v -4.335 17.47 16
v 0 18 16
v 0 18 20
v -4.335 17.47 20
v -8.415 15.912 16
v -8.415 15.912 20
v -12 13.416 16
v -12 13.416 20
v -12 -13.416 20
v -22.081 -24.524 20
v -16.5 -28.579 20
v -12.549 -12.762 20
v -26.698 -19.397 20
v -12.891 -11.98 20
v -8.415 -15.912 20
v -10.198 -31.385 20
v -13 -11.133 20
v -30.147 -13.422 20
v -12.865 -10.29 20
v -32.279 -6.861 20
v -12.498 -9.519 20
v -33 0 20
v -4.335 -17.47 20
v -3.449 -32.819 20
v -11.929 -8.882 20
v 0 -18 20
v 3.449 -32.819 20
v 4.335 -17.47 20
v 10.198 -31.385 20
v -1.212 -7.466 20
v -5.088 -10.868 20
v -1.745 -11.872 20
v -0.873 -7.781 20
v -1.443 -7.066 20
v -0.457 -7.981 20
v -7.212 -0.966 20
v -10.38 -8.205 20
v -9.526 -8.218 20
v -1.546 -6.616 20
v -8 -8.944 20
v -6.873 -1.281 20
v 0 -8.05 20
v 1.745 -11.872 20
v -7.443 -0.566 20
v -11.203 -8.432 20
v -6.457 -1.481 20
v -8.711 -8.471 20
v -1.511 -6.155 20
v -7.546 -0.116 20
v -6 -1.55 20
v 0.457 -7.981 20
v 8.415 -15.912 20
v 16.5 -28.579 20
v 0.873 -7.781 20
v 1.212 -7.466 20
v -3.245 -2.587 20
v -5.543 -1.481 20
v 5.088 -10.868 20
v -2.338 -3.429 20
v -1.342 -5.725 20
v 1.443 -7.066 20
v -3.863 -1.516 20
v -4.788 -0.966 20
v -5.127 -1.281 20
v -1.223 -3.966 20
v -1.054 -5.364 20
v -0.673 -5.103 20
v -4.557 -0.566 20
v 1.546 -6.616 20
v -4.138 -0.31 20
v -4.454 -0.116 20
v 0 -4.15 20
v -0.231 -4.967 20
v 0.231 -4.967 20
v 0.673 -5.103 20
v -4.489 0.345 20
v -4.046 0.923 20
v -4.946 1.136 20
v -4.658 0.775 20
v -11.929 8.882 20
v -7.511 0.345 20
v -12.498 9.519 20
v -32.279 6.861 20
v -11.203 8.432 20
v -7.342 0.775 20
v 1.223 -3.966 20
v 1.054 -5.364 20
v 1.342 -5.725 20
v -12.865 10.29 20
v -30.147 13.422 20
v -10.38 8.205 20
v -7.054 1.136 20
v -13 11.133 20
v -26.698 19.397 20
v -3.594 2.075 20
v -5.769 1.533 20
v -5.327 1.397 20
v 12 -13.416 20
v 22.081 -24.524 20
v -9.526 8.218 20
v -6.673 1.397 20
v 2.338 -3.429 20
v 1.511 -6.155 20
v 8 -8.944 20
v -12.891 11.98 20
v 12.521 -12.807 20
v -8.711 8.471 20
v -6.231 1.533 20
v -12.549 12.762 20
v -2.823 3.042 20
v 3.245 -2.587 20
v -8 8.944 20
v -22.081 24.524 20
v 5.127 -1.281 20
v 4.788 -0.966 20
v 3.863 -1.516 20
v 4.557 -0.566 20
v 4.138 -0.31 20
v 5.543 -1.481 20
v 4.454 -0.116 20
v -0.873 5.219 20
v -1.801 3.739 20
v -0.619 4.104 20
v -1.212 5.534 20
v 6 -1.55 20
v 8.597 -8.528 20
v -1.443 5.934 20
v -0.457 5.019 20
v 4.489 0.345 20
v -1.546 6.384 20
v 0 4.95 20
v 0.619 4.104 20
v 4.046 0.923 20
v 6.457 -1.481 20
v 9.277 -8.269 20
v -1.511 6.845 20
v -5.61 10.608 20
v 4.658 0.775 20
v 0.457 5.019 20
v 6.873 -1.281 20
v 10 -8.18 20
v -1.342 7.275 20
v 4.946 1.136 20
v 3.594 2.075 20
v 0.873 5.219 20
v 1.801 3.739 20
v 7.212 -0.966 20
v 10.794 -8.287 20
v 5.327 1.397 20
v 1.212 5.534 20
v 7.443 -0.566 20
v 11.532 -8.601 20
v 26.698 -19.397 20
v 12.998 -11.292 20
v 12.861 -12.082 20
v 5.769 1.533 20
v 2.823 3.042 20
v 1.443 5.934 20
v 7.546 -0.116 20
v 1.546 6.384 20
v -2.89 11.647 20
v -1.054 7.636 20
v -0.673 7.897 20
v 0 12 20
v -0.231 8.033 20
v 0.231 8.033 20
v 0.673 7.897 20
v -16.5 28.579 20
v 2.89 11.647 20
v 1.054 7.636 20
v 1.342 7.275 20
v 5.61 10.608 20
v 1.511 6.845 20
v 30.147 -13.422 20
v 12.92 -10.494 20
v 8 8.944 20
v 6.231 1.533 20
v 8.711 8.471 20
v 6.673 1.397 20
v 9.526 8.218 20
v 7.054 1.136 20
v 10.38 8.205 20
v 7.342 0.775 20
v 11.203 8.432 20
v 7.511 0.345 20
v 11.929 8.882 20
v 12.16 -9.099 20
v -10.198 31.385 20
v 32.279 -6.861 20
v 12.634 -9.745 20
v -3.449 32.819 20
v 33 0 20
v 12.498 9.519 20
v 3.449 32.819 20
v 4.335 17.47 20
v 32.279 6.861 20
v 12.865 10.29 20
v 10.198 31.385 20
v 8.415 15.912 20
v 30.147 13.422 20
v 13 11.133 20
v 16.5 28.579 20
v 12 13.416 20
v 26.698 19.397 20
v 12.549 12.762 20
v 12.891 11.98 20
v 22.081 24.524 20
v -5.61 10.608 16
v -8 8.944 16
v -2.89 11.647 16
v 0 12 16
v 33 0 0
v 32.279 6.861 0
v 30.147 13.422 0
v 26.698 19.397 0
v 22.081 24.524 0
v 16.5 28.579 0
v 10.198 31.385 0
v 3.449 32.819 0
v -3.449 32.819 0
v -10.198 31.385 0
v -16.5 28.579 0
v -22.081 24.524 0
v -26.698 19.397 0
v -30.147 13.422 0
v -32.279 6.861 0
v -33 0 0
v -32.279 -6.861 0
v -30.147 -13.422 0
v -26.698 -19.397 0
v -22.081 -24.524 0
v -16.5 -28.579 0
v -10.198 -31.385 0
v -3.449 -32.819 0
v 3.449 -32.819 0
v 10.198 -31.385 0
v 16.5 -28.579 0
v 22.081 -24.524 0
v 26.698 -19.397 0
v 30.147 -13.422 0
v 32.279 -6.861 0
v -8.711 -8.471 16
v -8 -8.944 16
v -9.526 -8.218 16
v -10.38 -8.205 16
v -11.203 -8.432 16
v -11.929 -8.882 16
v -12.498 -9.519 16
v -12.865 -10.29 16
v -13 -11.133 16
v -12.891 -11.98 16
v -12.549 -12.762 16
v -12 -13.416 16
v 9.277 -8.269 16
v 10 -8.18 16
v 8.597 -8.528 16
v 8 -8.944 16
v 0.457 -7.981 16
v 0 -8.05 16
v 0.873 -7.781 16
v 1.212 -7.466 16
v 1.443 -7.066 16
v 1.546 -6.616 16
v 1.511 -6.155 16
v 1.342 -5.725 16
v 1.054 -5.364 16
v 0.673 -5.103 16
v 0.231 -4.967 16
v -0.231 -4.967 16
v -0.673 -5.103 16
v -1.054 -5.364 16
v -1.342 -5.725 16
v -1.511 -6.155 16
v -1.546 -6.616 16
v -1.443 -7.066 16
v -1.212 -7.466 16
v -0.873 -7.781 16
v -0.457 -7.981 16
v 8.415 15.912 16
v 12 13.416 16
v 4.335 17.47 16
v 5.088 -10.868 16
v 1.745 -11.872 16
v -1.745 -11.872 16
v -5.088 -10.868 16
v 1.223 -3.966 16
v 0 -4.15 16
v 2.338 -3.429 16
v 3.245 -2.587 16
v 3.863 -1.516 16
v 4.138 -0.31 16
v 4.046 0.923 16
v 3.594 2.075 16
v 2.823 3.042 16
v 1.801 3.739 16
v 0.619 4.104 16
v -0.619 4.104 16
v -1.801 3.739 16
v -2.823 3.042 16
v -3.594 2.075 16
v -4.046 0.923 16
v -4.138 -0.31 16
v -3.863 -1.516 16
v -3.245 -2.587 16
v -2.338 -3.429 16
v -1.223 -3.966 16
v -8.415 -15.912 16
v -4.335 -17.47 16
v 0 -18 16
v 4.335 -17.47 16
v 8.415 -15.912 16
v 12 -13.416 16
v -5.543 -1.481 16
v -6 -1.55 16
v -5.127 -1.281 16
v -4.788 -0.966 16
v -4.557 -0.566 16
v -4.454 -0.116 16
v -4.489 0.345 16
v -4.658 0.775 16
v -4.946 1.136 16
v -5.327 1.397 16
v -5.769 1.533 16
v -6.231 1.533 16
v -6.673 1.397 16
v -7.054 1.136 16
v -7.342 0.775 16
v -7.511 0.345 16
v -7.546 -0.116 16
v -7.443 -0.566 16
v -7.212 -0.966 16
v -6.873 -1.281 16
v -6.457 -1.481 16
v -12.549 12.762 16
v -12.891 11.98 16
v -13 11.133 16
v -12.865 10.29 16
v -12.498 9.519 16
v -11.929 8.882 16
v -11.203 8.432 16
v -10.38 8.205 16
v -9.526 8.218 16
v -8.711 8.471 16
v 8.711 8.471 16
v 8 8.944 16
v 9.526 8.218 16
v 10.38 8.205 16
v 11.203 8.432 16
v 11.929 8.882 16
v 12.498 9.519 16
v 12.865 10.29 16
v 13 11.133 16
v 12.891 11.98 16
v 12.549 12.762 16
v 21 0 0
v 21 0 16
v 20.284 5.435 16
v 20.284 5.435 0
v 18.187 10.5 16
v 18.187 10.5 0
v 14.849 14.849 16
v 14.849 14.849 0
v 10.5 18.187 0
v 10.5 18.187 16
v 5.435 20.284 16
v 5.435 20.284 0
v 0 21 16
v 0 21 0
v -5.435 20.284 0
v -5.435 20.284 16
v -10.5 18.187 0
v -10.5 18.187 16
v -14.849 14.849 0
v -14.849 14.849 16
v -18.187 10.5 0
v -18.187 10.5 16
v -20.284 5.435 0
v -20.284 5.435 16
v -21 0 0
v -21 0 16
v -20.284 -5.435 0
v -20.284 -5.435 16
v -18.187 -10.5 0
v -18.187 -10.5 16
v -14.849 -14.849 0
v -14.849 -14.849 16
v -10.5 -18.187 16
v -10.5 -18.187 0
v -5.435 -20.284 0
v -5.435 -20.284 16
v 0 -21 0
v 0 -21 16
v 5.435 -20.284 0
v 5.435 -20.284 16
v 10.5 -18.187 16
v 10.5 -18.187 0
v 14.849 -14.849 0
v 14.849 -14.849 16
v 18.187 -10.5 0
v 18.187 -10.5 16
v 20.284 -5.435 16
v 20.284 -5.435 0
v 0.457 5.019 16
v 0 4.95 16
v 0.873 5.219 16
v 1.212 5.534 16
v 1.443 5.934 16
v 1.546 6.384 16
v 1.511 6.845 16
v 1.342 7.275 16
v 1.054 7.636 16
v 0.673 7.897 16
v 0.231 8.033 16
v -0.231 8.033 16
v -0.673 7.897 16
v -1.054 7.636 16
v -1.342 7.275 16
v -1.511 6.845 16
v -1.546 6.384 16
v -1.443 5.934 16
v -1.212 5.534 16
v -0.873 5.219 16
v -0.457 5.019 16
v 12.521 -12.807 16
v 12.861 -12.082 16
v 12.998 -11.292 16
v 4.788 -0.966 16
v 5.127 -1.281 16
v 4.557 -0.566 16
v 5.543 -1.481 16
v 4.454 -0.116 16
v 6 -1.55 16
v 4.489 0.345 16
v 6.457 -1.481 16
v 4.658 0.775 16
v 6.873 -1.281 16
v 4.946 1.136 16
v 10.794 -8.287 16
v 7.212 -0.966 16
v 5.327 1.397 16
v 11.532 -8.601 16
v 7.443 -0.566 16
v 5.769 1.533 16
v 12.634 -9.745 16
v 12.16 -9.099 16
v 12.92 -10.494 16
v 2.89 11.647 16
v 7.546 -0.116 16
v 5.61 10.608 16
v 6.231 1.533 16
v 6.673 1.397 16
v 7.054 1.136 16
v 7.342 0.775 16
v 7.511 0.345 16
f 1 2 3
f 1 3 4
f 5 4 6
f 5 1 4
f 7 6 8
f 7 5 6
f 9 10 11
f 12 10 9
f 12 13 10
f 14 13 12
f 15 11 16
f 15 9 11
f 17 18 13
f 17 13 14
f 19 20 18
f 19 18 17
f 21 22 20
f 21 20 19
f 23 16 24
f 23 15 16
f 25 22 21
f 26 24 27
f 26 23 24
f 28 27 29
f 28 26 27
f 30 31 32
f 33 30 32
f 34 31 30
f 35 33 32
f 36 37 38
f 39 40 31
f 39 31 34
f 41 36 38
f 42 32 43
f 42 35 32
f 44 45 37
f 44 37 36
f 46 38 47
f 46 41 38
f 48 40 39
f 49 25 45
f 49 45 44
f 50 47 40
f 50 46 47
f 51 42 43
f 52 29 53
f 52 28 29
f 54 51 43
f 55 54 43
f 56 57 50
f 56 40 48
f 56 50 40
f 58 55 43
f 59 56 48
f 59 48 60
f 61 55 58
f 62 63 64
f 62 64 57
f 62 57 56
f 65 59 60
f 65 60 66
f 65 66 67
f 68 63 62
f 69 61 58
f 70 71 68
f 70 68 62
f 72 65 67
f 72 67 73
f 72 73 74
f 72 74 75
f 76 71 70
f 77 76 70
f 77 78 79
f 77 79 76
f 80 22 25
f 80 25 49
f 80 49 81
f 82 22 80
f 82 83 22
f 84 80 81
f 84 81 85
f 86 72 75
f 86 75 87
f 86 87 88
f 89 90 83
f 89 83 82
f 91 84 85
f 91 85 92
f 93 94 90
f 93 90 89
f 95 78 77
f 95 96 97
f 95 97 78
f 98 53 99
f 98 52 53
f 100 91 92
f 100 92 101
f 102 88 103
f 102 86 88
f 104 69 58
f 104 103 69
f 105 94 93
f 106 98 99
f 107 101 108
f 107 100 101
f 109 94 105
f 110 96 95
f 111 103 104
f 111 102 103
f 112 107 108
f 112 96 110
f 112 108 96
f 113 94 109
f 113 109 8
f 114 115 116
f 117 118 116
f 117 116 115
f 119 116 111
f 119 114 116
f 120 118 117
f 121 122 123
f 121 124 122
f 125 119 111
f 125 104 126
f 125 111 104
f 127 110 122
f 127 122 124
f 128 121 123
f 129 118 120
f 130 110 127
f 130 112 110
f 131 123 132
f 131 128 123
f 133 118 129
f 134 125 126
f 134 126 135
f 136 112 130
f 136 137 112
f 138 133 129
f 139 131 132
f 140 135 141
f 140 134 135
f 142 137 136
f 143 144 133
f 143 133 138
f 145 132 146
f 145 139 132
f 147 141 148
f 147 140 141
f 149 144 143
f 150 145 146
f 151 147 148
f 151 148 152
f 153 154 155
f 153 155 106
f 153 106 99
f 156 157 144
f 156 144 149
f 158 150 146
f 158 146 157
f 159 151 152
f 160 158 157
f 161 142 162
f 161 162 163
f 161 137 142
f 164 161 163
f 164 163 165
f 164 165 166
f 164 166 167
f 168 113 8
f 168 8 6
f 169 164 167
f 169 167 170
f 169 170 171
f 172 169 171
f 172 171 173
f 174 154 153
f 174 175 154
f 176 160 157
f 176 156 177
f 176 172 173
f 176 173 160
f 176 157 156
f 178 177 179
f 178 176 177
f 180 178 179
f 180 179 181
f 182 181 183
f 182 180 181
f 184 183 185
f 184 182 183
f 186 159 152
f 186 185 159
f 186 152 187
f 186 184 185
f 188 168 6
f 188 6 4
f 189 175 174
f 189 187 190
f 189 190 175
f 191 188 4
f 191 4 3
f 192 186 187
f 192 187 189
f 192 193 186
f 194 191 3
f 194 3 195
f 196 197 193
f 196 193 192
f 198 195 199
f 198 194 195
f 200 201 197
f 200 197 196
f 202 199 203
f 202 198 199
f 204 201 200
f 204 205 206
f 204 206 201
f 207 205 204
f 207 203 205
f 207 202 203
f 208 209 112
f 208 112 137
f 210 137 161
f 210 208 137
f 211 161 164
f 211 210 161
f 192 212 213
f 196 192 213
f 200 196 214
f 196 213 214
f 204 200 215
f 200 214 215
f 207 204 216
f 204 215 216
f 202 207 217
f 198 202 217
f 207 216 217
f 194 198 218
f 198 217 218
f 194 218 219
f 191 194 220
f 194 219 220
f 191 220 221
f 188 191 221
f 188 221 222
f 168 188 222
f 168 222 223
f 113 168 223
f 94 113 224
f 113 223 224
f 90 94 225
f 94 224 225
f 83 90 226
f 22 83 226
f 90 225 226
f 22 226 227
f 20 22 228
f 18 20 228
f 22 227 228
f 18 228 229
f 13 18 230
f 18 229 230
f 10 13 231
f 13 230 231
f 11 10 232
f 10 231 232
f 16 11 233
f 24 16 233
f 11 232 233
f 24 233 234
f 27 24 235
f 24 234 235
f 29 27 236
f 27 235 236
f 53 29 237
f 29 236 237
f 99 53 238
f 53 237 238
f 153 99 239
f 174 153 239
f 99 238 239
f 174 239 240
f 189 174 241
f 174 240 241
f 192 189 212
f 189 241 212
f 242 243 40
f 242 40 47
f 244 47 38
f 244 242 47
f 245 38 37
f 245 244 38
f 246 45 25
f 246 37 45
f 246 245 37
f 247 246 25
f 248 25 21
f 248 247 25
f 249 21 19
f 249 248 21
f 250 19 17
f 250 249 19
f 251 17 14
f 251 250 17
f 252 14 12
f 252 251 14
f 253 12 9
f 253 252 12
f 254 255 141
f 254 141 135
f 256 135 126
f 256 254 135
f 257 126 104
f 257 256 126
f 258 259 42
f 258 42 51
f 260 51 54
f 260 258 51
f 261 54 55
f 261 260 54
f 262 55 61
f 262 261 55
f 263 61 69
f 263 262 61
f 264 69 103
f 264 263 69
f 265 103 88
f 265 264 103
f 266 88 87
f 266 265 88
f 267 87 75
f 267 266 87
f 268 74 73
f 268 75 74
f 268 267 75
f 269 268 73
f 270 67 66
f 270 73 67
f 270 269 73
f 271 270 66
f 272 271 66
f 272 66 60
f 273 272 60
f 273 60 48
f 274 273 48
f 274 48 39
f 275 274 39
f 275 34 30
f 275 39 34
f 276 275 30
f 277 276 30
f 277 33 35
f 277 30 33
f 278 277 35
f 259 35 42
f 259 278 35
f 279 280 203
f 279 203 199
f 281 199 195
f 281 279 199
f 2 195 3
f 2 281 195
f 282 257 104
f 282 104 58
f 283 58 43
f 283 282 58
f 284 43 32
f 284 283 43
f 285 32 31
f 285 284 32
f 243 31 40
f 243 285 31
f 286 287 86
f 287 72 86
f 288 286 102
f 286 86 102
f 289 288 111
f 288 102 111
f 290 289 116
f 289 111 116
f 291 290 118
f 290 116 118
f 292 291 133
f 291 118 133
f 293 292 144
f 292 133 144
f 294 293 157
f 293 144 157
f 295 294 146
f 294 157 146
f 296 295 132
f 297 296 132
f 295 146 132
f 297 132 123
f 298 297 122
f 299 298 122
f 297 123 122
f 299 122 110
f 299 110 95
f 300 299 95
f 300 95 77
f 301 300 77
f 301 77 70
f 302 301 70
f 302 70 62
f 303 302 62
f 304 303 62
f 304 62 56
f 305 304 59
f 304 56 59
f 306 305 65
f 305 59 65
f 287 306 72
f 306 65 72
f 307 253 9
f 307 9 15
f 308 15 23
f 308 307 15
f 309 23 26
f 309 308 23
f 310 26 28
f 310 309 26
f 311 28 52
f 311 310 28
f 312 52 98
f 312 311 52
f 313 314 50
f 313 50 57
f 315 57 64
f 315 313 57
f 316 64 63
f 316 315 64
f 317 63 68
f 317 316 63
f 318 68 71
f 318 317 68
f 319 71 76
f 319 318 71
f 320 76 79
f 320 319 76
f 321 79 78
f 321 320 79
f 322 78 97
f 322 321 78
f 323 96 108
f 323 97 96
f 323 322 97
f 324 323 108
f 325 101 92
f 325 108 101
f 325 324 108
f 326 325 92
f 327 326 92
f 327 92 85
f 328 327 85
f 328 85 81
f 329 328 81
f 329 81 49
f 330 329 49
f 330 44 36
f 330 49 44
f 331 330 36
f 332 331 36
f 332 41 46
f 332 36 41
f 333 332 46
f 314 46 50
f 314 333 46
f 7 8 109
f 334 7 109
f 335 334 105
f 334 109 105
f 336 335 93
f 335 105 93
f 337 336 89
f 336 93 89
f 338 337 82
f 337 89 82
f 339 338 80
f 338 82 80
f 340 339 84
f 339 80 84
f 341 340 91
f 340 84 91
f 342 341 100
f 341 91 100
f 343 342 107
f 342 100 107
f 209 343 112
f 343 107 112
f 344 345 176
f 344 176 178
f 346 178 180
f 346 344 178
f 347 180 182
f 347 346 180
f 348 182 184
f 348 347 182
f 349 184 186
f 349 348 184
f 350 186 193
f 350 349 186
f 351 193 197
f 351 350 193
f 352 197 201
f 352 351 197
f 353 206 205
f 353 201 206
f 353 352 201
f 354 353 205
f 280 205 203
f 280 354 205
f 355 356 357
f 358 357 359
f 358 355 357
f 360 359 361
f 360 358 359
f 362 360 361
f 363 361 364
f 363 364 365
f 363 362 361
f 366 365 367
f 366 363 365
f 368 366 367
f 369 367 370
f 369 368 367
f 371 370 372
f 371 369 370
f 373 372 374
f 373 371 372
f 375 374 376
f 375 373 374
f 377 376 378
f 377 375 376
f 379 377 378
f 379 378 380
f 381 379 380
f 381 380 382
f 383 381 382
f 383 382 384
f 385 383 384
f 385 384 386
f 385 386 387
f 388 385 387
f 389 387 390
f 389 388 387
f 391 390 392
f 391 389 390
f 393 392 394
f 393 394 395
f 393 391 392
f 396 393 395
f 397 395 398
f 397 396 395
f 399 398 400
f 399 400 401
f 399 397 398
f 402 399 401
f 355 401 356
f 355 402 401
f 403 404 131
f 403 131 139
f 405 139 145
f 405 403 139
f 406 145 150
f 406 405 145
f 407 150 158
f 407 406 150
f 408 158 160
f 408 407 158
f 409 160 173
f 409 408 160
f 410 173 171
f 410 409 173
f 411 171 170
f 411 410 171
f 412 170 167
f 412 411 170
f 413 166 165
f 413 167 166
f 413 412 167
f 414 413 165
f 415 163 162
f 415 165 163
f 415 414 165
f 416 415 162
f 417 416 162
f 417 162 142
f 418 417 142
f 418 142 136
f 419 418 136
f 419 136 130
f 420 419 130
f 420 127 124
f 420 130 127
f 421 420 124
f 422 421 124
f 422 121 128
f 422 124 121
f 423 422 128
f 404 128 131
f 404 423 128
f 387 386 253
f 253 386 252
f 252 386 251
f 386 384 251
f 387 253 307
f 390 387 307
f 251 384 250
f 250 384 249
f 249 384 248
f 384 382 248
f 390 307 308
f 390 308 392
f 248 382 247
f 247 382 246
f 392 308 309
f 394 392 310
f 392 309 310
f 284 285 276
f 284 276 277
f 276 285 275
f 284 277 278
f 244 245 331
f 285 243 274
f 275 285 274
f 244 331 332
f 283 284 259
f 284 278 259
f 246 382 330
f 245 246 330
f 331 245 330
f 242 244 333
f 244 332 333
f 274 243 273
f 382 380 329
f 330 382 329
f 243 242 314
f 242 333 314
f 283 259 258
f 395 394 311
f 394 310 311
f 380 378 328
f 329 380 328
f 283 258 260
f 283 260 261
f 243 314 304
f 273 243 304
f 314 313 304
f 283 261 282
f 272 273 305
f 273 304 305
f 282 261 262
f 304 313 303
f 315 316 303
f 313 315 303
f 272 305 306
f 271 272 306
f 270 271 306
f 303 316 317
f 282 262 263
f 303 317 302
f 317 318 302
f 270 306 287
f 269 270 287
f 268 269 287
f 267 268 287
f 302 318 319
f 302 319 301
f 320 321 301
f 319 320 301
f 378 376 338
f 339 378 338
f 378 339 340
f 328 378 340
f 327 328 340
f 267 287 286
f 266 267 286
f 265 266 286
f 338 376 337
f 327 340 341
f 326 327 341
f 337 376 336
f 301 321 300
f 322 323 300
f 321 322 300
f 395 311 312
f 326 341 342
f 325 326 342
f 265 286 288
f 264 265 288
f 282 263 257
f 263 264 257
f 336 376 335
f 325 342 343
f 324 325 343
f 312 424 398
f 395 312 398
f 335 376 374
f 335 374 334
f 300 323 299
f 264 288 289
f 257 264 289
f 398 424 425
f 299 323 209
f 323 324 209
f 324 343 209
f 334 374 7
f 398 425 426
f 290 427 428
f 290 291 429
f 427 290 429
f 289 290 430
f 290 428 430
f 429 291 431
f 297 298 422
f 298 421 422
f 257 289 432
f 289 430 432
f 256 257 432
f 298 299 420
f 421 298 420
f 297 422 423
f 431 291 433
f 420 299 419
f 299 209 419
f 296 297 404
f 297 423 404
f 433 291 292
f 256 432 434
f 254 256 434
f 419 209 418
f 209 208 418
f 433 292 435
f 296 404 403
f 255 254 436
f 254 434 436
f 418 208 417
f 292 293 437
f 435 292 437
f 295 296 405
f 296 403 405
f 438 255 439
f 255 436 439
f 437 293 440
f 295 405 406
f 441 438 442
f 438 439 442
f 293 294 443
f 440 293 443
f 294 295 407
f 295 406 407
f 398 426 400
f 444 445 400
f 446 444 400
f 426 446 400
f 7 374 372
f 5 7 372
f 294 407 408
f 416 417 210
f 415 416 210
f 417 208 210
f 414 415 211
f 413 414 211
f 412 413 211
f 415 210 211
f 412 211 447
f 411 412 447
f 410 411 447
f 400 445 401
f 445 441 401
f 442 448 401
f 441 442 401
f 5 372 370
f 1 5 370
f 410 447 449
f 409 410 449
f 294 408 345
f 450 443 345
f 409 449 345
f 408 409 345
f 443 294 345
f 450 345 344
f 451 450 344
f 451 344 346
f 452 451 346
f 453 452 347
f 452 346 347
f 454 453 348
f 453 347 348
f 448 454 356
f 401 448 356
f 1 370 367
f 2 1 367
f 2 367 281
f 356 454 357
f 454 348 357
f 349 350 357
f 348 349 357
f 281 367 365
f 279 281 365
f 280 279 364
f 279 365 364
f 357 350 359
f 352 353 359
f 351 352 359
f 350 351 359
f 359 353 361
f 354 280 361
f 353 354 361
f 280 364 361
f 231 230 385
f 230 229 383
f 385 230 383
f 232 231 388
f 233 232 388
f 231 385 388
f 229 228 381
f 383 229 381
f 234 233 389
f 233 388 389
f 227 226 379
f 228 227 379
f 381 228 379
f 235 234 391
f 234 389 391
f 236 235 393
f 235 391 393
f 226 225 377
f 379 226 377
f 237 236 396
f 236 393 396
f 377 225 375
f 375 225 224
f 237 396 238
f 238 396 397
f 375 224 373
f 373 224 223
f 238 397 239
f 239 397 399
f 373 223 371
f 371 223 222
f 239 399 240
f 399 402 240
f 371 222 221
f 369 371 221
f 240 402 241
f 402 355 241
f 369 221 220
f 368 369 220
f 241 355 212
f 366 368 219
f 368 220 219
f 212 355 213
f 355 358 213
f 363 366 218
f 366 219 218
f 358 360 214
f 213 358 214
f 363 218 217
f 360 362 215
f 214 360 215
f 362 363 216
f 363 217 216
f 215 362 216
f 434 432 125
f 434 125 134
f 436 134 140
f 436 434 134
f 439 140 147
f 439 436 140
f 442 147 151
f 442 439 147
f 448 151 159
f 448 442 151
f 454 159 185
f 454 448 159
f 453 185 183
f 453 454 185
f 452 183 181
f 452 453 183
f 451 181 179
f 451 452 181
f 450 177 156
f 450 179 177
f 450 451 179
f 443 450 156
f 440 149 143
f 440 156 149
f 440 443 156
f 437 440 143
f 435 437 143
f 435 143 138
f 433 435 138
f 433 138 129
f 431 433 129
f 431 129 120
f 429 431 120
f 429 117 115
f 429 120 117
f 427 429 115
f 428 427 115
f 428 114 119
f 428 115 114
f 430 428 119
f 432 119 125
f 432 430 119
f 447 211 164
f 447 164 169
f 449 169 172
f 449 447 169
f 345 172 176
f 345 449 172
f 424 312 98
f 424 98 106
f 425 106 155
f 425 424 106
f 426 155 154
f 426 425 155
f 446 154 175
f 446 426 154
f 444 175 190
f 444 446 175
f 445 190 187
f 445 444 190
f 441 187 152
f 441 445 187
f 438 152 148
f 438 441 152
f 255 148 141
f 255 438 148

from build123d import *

# Parameters (mm, degrees)
SKETCH_1_R          = 33
EXTRUDE_1_DEPTH     = 20
CUT_EXTRUDE_2_DEPTH = 25
SKETCH_1_6_R        = 21
CUT_EXTRUDE_3_DEPTH = 16
CUT_EXTRUDE_5_DEPTH = 30


with BuildPart() as part:
    # 草图1 → 凸台-拉伸1 (new body)
    with BuildSketch(Plane.XY):
        Circle(SKETCH_1_R)
    extrude(amount=EXTRUDE_1_DEPTH)

    # 草图1<5> → 切除-拉伸2 (cut, symmetric)
    with BuildSketch(Plane.XY):
        with BuildLine():
            ThreePointArc((-8, -8.94427191), (-8.929533731, -8.377822811), (-10, -8.180339887))
            ThreePointArc((-10, -8.180339887), (-12.802517077, -10.109873618), (-12, -13.416407865))
            ThreePointArc((-12, -13.416407865), (0, -18), (12, -13.416407865))
            ThreePointArc((12, -13.416407865), (12.802517077, -10.109873618), (10, -8.180339887))
            ThreePointArc((10, -8.180339887), (8.929533731, -8.377822811), (8, -8.94427191))
            ThreePointArc((8, -8.94427191), (0, -12), (-8, -8.94427191))
        make_face()
        with BuildLine():
            ThreePointArc((-12, 13.416407865), (-12.236067977, 9.180339887), (-8, 8.94427191))
            ThreePointArc((-8, 8.94427191), (-4.281865077, 11.210068308), (0, 12))
            ThreePointArc((0, 12), (4.281865077, 11.210068308), (8, 8.94427191))
            ThreePointArc((8, 8.94427191), (12.236067977, 9.180339887), (12, 13.416407865))
            ThreePointArc((12, 13.416407865), (6.422797616, 16.815102461), (0, 18))
            ThreePointArc((0, 18), (-6.422797616, 16.815102461), (-12, 13.416407865))
        make_face()
    extrude(amount=CUT_EXTRUDE_2_DEPTH, both=True, mode=Mode.SUBTRACT)

    # 草图1<6> → 切除-拉伸3 (cut)
    with BuildSketch(Plane.XY):
        Circle(SKETCH_1_6_R)
    extrude(amount=CUT_EXTRUDE_3_DEPTH, mode=Mode.SUBTRACT)

    # 草图1<7> → 切除-拉伸5 (cut, symmetric)
    with BuildSketch(Plane.XY):
        with BuildLine():
            ThreePointArc((0, 8.05), (-1.55, 6.5), (0, 4.95))
            ThreePointArc((0, 4.95), (1.55, 6.5), (0, 8.05))
        make_face()
        with BuildLine():
            ThreePointArc((0, -4.95), (-1.55, -6.5), (0, -8.05))
            ThreePointArc((0, -8.05), (1.55, -6.5), (0, -4.95))
        make_face()
        with BuildLine():
            ThreePointArc((6, 1.55), (4.45, 0), (6, -1.55))
            ThreePointArc((6, -1.55), (7.55, 0), (6, 1.55))
        make_face()
        with BuildLine():
            ThreePointArc((-6, 1.55), (-7.55, 0), (-6, -1.55))
            ThreePointArc((-6, -1.55), (-4.45, 0), (-6, 1.55))
        make_face()
        with BuildLine():
            ThreePointArc((0, 4.15), (-4.15, 0), (0, -4.15))
            ThreePointArc((0, -4.15), (4.15, 0), (0, 4.15))
        make_face()
    extrude(amount=CUT_EXTRUDE_5_DEPTH, both=True, mode=Mode.SUBTRACT)


solid = part.part
